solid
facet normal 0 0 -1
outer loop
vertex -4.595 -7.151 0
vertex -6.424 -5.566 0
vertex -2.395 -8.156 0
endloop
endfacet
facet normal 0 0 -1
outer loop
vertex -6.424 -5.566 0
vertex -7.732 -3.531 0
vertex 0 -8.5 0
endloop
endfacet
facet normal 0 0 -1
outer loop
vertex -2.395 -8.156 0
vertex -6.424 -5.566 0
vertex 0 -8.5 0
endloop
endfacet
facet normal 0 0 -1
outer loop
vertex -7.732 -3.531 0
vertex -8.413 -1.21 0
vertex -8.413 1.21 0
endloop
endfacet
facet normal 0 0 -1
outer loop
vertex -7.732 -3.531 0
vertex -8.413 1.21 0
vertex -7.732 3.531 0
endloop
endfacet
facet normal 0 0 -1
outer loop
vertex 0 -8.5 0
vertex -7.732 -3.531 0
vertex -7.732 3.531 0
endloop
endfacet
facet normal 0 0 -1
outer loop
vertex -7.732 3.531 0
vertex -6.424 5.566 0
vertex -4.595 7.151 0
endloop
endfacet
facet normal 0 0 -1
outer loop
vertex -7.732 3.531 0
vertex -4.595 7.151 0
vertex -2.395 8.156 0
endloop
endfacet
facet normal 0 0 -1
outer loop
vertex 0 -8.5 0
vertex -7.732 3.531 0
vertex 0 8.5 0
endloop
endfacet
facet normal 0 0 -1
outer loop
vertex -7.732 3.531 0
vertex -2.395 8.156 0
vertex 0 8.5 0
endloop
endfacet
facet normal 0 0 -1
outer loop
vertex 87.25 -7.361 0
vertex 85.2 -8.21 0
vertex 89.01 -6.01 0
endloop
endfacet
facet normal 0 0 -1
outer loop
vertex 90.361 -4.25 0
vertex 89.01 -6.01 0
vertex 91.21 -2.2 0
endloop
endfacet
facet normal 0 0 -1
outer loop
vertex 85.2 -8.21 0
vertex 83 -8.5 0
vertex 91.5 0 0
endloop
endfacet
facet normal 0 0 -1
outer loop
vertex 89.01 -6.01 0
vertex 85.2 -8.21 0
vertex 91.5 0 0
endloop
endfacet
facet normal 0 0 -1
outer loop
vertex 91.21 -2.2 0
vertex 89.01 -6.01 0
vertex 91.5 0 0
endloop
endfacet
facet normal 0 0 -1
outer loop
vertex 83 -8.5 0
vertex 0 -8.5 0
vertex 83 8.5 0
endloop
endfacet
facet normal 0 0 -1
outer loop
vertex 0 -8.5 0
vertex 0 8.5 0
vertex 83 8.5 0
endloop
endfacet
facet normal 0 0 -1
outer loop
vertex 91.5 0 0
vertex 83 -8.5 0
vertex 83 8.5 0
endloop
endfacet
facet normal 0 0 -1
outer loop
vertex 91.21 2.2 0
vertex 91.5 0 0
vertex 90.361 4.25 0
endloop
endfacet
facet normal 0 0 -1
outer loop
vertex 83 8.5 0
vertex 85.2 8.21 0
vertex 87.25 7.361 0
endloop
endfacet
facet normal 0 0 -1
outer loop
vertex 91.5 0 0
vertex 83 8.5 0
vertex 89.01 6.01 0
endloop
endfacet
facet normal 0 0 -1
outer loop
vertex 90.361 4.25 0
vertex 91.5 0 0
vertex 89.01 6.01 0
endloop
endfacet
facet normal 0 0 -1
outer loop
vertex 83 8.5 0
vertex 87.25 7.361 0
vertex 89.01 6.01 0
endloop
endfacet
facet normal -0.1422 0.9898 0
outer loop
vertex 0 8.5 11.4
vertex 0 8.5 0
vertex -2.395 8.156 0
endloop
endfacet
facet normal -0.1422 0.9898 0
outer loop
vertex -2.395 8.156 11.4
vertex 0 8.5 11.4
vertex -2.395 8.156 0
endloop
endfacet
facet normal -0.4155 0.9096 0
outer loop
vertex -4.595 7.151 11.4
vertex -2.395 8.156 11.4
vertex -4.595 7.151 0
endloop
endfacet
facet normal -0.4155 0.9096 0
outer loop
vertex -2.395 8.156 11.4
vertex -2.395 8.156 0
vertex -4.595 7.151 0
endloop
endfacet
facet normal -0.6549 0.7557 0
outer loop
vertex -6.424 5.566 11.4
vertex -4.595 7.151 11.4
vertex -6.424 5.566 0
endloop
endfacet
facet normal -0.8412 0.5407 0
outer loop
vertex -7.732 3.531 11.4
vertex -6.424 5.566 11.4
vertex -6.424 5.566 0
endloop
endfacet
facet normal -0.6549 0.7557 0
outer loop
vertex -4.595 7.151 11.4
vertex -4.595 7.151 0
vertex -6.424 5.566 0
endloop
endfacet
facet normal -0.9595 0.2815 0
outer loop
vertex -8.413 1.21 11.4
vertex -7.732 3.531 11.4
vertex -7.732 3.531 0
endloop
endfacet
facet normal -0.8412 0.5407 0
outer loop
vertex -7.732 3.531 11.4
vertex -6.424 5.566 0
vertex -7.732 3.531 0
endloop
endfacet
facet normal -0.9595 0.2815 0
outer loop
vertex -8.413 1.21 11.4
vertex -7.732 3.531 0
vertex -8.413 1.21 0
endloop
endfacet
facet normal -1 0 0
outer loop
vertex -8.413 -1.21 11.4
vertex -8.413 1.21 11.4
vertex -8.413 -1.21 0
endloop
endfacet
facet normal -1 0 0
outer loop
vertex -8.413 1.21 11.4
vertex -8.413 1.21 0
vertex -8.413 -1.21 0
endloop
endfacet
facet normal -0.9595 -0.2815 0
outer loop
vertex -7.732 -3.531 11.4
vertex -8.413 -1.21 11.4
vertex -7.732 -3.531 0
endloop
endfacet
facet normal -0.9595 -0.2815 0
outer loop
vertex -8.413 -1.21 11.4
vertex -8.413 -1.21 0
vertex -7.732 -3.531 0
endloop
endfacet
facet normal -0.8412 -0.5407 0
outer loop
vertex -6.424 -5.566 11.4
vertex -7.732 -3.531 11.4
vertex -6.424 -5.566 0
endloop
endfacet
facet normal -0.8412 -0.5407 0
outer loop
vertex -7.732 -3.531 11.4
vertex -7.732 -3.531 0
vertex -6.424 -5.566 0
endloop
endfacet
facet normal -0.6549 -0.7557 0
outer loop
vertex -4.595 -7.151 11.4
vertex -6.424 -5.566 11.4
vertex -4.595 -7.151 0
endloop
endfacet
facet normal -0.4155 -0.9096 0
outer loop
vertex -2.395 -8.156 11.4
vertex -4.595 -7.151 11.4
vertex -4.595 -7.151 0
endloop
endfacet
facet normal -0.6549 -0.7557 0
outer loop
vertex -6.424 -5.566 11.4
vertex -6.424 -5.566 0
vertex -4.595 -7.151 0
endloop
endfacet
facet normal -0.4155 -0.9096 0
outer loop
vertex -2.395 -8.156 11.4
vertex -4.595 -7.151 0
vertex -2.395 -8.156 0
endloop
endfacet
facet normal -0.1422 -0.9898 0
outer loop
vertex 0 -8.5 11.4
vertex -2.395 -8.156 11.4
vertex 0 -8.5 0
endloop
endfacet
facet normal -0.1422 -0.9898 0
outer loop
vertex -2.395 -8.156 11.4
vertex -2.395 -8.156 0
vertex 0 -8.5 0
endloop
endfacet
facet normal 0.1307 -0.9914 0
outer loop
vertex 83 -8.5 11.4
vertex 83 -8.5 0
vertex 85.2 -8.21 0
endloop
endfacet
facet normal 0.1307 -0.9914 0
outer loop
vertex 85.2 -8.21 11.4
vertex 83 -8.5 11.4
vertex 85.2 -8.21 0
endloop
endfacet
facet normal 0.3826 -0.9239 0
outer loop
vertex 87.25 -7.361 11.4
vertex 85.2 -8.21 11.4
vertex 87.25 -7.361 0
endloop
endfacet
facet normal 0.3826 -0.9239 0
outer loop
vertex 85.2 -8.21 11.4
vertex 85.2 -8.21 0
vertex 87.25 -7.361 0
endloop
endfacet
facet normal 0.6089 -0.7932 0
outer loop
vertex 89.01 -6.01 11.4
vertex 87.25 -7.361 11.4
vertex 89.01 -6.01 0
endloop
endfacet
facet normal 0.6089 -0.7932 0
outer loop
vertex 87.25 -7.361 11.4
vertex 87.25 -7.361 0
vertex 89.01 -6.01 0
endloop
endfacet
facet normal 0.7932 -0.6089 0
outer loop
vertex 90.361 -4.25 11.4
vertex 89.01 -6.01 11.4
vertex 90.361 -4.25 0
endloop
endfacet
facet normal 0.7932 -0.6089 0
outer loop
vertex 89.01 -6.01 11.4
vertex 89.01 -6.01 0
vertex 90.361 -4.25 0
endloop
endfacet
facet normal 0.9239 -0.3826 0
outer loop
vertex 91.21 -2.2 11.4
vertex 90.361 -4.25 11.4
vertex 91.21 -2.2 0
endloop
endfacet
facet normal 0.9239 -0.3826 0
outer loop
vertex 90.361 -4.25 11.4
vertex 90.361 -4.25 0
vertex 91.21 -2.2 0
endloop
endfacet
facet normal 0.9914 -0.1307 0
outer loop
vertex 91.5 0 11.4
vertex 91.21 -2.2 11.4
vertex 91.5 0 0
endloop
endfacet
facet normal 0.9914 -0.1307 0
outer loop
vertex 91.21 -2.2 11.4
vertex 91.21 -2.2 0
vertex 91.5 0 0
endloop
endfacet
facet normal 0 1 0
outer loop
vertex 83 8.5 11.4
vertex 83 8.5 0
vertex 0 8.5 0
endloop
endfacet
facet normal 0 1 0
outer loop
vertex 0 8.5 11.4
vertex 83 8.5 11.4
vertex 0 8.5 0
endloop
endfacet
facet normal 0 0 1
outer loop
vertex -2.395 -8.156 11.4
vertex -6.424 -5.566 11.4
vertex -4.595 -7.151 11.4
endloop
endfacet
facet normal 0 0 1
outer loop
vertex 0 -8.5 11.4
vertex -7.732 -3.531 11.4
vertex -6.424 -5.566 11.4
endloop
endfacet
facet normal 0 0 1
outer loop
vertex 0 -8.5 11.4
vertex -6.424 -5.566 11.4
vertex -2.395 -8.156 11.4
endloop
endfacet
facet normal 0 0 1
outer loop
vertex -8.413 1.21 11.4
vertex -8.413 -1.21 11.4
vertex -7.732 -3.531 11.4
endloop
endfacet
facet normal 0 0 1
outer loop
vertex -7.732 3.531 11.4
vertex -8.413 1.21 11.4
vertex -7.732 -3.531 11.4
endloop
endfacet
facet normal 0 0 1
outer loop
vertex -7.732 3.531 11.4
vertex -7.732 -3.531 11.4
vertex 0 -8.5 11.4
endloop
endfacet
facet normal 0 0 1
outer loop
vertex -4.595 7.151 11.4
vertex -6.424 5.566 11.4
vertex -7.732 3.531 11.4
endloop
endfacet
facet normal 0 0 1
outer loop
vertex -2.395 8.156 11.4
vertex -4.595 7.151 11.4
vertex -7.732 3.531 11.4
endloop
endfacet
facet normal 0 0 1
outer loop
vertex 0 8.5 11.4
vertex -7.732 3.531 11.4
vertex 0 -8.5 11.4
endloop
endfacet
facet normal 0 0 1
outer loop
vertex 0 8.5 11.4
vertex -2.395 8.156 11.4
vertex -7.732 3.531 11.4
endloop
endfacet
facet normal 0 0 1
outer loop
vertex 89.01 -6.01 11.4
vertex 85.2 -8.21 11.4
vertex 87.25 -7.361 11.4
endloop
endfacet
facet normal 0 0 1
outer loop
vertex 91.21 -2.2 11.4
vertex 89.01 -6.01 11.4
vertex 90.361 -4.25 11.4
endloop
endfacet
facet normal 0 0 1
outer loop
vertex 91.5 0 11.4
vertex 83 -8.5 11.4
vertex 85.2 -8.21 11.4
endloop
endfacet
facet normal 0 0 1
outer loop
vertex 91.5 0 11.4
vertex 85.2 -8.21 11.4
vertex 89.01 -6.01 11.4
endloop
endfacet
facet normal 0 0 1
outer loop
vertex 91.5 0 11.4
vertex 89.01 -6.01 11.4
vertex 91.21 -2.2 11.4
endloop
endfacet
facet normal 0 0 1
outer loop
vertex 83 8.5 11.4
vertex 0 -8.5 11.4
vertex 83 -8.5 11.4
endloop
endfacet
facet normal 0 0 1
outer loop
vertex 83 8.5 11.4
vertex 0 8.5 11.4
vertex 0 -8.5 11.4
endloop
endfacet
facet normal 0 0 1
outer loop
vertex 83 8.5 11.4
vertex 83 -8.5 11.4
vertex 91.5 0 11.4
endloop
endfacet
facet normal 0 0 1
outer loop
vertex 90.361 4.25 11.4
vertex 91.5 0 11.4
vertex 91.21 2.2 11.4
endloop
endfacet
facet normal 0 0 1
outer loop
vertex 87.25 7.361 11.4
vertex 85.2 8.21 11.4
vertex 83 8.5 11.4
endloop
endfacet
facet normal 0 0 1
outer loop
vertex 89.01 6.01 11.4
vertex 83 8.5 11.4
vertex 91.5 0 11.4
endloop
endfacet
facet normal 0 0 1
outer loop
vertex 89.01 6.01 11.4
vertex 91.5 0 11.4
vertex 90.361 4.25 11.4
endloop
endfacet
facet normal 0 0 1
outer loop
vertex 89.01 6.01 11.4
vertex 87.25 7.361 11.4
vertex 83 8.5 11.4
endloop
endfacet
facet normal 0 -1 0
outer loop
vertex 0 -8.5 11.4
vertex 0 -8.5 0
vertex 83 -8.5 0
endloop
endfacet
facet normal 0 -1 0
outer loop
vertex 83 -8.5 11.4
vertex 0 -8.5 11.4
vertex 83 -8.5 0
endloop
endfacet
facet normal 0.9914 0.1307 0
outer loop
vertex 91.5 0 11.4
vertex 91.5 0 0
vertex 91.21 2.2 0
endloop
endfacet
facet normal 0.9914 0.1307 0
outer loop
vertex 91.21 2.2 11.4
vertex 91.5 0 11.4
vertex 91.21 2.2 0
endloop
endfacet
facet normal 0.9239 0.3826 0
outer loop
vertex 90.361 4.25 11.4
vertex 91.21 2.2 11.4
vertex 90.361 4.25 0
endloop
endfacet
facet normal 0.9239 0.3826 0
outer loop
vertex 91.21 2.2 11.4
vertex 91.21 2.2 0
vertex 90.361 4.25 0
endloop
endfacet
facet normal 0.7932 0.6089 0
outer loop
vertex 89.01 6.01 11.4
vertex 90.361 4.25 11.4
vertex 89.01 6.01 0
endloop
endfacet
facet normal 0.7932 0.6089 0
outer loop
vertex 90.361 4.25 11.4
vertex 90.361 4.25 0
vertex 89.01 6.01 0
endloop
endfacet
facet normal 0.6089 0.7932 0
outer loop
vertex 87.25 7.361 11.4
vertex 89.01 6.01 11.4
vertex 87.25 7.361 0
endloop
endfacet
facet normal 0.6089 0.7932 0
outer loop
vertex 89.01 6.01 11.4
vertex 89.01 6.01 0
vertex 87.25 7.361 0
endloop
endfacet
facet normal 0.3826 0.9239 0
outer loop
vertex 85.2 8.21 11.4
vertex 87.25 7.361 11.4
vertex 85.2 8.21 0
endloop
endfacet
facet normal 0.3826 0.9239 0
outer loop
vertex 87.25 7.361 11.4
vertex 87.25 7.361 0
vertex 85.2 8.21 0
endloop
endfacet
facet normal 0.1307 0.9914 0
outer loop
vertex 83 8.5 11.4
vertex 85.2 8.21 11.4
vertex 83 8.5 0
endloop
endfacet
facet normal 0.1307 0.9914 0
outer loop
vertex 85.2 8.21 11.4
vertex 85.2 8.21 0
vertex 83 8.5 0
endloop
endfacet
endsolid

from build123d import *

# Parameters (mm, degrees)
F1_DEPTH = 11.4


with BuildPart() as f1:
    # F0 (on Top) → F1 (new body)
    with BuildSketch(Plane.XY):
        with BuildLine():
            ThreePointArc((0, 8.5), (6.010408, 6.010408), (8.5, 0))
            ThreePointArc((8.5, 0), (6.010408, -6.010408), (0, -8.5))
            Line((0, -8.5), (83, -8.5))
            ThreePointArc((83, -8.5), (74.5, 0), (83, 8.5))
            Line((83, 8.5), (0, 8.5))
        make_face()
        with BuildLine():
            ThreePointArc((0, -8.5), (6.010408, -6.010408), (8.5, 0))
            ThreePointArc((8.5, 0), (6.010408, 6.010408), (0, 8.5))
            ThreePointArc((0, 8.5), (-8.5, 0), (0, -8.5))
        make_face()
        with BuildLine():
            ThreePointArc((91.5, 0), (89.010408, 6.010408), (83, 8.5))
            ThreePointArc((83, 8.5), (74.5, 0), (83, -8.5))
            ThreePointArc((83, -8.5), (89.010408, -6.010408), (91.5, 0))
        make_face()
    extrude(amount=F1_DEPTH)


solid = f1.part
